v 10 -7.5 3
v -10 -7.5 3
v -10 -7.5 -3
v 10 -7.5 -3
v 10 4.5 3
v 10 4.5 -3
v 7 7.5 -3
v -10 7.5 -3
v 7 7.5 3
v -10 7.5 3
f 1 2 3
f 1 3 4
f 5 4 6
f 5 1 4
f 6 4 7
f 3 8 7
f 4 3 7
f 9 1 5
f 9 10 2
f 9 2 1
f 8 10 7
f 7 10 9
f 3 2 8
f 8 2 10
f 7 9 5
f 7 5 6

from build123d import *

# Parameters (mm, degrees)
SKETCH_1_W      = 20
SKETCH_1_H      = 15
EXTRUDE_1_DEPTH = 3
CHAMFER_1_SIZE  = 3


with BuildPart() as part:
    # 草图1 → 凸台-拉伸1 (new, symmetric)
    with BuildSketch(Plane.XY):
        Rectangle(SKETCH_1_W, SKETCH_1_H)
    extrude(amount=EXTRUDE_1_DEPTH, both=True)

    # 倒角1
    chamfer_1_edges = [part.edges().sort_by_distance(p)[0] for p in [
        (10, 7.5, 0),
    ]]
    chamfer(chamfer_1_edges, length=CHAMFER_1_SIZE)


solid = part.part
